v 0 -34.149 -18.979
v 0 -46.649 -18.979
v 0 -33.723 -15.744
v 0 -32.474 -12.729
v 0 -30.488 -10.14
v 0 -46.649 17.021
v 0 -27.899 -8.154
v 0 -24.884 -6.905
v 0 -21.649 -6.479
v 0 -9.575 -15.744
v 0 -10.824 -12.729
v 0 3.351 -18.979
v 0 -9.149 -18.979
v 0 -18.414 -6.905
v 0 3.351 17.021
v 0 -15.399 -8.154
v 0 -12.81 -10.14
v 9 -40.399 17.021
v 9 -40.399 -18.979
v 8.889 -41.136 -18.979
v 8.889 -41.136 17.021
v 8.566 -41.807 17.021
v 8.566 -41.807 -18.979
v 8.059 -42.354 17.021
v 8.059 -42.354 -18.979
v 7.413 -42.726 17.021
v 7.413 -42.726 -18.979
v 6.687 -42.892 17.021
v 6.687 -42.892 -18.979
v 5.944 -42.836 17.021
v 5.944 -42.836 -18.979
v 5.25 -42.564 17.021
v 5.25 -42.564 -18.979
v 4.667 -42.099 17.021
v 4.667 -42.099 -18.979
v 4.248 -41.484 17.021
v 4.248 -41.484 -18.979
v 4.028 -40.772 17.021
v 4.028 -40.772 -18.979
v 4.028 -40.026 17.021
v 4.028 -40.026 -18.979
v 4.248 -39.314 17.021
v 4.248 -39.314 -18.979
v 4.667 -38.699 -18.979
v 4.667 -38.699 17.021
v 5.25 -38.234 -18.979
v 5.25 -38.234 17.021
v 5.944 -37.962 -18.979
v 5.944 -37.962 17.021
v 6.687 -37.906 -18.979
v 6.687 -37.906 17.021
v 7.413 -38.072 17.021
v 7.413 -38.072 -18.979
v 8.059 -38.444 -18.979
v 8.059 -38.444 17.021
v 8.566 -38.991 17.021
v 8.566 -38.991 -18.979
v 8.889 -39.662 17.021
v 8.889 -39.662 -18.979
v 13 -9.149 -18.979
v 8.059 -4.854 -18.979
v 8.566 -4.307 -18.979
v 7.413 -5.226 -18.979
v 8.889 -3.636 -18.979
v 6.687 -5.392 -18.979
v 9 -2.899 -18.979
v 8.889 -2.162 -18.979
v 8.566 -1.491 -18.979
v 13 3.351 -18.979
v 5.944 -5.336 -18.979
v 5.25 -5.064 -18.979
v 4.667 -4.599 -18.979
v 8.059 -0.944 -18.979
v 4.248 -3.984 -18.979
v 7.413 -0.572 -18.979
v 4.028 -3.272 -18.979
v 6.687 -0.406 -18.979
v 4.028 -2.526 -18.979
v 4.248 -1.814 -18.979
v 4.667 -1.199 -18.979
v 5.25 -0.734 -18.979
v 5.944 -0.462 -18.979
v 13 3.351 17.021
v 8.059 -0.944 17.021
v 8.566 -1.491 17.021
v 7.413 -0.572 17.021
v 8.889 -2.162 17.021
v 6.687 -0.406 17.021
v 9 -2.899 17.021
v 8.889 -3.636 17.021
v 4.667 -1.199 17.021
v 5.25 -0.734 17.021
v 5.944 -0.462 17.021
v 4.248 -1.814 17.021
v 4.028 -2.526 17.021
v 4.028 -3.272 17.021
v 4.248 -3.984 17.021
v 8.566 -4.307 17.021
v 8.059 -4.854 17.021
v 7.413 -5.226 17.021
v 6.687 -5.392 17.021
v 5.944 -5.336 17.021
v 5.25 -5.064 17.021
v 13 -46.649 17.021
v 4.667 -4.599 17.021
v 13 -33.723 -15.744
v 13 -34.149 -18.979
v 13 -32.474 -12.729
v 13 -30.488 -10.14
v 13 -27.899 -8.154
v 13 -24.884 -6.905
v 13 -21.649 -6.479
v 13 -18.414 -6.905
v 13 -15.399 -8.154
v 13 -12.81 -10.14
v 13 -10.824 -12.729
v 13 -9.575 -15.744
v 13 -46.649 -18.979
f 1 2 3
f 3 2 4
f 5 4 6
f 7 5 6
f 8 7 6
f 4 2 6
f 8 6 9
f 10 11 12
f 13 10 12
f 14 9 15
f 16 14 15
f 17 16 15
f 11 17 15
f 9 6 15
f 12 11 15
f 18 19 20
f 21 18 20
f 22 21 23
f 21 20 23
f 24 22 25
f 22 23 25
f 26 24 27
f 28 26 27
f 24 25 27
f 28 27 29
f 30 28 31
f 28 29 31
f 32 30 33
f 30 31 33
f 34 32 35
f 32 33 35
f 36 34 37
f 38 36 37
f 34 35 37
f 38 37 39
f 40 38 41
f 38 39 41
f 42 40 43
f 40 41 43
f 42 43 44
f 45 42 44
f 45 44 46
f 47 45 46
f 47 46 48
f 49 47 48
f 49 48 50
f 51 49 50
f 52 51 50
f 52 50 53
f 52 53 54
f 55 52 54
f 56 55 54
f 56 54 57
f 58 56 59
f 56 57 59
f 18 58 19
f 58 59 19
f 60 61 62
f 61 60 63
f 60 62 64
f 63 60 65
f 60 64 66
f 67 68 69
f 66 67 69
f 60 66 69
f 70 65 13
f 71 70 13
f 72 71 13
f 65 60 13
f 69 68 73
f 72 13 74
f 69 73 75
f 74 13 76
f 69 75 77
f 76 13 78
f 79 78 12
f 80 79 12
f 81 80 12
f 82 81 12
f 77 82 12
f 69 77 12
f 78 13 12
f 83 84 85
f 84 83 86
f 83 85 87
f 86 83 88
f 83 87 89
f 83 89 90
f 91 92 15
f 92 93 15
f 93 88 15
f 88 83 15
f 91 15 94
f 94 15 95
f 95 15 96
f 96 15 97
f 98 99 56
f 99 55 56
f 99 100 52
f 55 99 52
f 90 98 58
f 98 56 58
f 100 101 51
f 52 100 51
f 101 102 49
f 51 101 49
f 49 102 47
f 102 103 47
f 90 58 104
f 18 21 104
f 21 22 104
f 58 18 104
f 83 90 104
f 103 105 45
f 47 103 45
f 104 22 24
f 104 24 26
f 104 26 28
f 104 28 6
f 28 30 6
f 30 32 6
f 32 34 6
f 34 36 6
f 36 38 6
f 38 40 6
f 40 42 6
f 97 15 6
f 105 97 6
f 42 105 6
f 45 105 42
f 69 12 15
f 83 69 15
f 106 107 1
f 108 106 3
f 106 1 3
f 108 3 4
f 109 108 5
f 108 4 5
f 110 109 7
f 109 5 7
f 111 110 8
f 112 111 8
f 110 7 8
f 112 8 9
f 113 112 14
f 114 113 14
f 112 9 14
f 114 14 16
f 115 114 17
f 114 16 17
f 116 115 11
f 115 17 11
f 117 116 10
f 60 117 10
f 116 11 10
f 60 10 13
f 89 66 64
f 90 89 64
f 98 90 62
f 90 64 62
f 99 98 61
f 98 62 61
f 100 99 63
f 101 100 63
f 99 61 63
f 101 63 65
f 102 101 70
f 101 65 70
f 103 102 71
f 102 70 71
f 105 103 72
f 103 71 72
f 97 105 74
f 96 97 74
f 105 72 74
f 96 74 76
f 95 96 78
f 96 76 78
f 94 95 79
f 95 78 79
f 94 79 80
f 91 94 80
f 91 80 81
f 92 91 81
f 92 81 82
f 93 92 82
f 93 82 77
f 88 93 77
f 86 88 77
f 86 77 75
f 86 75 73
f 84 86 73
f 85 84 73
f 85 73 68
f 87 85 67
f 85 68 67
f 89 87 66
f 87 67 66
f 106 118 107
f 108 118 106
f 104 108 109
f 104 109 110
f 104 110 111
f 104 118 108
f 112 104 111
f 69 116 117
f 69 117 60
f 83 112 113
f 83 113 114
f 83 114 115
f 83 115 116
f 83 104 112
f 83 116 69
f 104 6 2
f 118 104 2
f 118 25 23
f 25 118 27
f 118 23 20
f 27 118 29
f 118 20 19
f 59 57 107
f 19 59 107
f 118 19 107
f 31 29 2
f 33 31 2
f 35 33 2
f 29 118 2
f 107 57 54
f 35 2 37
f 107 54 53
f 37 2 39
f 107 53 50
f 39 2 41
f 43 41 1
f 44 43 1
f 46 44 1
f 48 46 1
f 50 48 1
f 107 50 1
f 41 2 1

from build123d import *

# Parameters (mm, degrees)
F1_DEPTH = 13
F2_R     = 2.5
F4_DEPTH = 36
F3_R     = 2.5
F5_DEPTH = 36


with BuildPart() as f1:
    # F0 (on Right) → F1 (new body)
    with BuildSketch(Plane.YZ):
        with BuildLine():
            Line((3.351025, 17.020911), (-46.648975, 17.020911))
            Line((-46.648975, 17.020911), (-46.648975, -18.979089))
            Line((-46.648975, -18.979089), (-34.148975, -18.979089))
            ThreePointArc((-34.148975, -18.979089), (-21.648975, -6.479089), (-9.148975, -18.979089))
            Line((-9.148975, -18.979089), (3.351025, -18.979089))
            Line((3.351025, -18.979089), (3.351025, 17.020911))
        make_face()
    extrude(amount=F1_DEPTH)

    # F2 (on face) → F4 (cut)
    with BuildSketch(Plane(origin=(0, 0, -18.979089), x_dir=(1, 0, 0), z_dir=(0, 0, -1))):
        with Locations((6.5, 40.398975)):
            Circle(F2_R)
    extrude(amount=-F4_DEPTH, mode=Mode.SUBTRACT)

    # F3 (on face) → F5 (cut)
    with BuildSketch(Plane(origin=(0, 0, -18.979089), x_dir=(1, 0, 0), z_dir=(0, 0, -1))):
        with Locations((6.5, 2.898975)):
            Circle(F3_R)
    extrude(amount=-F5_DEPTH, mode=Mode.SUBTRACT)


solid = f1.part
